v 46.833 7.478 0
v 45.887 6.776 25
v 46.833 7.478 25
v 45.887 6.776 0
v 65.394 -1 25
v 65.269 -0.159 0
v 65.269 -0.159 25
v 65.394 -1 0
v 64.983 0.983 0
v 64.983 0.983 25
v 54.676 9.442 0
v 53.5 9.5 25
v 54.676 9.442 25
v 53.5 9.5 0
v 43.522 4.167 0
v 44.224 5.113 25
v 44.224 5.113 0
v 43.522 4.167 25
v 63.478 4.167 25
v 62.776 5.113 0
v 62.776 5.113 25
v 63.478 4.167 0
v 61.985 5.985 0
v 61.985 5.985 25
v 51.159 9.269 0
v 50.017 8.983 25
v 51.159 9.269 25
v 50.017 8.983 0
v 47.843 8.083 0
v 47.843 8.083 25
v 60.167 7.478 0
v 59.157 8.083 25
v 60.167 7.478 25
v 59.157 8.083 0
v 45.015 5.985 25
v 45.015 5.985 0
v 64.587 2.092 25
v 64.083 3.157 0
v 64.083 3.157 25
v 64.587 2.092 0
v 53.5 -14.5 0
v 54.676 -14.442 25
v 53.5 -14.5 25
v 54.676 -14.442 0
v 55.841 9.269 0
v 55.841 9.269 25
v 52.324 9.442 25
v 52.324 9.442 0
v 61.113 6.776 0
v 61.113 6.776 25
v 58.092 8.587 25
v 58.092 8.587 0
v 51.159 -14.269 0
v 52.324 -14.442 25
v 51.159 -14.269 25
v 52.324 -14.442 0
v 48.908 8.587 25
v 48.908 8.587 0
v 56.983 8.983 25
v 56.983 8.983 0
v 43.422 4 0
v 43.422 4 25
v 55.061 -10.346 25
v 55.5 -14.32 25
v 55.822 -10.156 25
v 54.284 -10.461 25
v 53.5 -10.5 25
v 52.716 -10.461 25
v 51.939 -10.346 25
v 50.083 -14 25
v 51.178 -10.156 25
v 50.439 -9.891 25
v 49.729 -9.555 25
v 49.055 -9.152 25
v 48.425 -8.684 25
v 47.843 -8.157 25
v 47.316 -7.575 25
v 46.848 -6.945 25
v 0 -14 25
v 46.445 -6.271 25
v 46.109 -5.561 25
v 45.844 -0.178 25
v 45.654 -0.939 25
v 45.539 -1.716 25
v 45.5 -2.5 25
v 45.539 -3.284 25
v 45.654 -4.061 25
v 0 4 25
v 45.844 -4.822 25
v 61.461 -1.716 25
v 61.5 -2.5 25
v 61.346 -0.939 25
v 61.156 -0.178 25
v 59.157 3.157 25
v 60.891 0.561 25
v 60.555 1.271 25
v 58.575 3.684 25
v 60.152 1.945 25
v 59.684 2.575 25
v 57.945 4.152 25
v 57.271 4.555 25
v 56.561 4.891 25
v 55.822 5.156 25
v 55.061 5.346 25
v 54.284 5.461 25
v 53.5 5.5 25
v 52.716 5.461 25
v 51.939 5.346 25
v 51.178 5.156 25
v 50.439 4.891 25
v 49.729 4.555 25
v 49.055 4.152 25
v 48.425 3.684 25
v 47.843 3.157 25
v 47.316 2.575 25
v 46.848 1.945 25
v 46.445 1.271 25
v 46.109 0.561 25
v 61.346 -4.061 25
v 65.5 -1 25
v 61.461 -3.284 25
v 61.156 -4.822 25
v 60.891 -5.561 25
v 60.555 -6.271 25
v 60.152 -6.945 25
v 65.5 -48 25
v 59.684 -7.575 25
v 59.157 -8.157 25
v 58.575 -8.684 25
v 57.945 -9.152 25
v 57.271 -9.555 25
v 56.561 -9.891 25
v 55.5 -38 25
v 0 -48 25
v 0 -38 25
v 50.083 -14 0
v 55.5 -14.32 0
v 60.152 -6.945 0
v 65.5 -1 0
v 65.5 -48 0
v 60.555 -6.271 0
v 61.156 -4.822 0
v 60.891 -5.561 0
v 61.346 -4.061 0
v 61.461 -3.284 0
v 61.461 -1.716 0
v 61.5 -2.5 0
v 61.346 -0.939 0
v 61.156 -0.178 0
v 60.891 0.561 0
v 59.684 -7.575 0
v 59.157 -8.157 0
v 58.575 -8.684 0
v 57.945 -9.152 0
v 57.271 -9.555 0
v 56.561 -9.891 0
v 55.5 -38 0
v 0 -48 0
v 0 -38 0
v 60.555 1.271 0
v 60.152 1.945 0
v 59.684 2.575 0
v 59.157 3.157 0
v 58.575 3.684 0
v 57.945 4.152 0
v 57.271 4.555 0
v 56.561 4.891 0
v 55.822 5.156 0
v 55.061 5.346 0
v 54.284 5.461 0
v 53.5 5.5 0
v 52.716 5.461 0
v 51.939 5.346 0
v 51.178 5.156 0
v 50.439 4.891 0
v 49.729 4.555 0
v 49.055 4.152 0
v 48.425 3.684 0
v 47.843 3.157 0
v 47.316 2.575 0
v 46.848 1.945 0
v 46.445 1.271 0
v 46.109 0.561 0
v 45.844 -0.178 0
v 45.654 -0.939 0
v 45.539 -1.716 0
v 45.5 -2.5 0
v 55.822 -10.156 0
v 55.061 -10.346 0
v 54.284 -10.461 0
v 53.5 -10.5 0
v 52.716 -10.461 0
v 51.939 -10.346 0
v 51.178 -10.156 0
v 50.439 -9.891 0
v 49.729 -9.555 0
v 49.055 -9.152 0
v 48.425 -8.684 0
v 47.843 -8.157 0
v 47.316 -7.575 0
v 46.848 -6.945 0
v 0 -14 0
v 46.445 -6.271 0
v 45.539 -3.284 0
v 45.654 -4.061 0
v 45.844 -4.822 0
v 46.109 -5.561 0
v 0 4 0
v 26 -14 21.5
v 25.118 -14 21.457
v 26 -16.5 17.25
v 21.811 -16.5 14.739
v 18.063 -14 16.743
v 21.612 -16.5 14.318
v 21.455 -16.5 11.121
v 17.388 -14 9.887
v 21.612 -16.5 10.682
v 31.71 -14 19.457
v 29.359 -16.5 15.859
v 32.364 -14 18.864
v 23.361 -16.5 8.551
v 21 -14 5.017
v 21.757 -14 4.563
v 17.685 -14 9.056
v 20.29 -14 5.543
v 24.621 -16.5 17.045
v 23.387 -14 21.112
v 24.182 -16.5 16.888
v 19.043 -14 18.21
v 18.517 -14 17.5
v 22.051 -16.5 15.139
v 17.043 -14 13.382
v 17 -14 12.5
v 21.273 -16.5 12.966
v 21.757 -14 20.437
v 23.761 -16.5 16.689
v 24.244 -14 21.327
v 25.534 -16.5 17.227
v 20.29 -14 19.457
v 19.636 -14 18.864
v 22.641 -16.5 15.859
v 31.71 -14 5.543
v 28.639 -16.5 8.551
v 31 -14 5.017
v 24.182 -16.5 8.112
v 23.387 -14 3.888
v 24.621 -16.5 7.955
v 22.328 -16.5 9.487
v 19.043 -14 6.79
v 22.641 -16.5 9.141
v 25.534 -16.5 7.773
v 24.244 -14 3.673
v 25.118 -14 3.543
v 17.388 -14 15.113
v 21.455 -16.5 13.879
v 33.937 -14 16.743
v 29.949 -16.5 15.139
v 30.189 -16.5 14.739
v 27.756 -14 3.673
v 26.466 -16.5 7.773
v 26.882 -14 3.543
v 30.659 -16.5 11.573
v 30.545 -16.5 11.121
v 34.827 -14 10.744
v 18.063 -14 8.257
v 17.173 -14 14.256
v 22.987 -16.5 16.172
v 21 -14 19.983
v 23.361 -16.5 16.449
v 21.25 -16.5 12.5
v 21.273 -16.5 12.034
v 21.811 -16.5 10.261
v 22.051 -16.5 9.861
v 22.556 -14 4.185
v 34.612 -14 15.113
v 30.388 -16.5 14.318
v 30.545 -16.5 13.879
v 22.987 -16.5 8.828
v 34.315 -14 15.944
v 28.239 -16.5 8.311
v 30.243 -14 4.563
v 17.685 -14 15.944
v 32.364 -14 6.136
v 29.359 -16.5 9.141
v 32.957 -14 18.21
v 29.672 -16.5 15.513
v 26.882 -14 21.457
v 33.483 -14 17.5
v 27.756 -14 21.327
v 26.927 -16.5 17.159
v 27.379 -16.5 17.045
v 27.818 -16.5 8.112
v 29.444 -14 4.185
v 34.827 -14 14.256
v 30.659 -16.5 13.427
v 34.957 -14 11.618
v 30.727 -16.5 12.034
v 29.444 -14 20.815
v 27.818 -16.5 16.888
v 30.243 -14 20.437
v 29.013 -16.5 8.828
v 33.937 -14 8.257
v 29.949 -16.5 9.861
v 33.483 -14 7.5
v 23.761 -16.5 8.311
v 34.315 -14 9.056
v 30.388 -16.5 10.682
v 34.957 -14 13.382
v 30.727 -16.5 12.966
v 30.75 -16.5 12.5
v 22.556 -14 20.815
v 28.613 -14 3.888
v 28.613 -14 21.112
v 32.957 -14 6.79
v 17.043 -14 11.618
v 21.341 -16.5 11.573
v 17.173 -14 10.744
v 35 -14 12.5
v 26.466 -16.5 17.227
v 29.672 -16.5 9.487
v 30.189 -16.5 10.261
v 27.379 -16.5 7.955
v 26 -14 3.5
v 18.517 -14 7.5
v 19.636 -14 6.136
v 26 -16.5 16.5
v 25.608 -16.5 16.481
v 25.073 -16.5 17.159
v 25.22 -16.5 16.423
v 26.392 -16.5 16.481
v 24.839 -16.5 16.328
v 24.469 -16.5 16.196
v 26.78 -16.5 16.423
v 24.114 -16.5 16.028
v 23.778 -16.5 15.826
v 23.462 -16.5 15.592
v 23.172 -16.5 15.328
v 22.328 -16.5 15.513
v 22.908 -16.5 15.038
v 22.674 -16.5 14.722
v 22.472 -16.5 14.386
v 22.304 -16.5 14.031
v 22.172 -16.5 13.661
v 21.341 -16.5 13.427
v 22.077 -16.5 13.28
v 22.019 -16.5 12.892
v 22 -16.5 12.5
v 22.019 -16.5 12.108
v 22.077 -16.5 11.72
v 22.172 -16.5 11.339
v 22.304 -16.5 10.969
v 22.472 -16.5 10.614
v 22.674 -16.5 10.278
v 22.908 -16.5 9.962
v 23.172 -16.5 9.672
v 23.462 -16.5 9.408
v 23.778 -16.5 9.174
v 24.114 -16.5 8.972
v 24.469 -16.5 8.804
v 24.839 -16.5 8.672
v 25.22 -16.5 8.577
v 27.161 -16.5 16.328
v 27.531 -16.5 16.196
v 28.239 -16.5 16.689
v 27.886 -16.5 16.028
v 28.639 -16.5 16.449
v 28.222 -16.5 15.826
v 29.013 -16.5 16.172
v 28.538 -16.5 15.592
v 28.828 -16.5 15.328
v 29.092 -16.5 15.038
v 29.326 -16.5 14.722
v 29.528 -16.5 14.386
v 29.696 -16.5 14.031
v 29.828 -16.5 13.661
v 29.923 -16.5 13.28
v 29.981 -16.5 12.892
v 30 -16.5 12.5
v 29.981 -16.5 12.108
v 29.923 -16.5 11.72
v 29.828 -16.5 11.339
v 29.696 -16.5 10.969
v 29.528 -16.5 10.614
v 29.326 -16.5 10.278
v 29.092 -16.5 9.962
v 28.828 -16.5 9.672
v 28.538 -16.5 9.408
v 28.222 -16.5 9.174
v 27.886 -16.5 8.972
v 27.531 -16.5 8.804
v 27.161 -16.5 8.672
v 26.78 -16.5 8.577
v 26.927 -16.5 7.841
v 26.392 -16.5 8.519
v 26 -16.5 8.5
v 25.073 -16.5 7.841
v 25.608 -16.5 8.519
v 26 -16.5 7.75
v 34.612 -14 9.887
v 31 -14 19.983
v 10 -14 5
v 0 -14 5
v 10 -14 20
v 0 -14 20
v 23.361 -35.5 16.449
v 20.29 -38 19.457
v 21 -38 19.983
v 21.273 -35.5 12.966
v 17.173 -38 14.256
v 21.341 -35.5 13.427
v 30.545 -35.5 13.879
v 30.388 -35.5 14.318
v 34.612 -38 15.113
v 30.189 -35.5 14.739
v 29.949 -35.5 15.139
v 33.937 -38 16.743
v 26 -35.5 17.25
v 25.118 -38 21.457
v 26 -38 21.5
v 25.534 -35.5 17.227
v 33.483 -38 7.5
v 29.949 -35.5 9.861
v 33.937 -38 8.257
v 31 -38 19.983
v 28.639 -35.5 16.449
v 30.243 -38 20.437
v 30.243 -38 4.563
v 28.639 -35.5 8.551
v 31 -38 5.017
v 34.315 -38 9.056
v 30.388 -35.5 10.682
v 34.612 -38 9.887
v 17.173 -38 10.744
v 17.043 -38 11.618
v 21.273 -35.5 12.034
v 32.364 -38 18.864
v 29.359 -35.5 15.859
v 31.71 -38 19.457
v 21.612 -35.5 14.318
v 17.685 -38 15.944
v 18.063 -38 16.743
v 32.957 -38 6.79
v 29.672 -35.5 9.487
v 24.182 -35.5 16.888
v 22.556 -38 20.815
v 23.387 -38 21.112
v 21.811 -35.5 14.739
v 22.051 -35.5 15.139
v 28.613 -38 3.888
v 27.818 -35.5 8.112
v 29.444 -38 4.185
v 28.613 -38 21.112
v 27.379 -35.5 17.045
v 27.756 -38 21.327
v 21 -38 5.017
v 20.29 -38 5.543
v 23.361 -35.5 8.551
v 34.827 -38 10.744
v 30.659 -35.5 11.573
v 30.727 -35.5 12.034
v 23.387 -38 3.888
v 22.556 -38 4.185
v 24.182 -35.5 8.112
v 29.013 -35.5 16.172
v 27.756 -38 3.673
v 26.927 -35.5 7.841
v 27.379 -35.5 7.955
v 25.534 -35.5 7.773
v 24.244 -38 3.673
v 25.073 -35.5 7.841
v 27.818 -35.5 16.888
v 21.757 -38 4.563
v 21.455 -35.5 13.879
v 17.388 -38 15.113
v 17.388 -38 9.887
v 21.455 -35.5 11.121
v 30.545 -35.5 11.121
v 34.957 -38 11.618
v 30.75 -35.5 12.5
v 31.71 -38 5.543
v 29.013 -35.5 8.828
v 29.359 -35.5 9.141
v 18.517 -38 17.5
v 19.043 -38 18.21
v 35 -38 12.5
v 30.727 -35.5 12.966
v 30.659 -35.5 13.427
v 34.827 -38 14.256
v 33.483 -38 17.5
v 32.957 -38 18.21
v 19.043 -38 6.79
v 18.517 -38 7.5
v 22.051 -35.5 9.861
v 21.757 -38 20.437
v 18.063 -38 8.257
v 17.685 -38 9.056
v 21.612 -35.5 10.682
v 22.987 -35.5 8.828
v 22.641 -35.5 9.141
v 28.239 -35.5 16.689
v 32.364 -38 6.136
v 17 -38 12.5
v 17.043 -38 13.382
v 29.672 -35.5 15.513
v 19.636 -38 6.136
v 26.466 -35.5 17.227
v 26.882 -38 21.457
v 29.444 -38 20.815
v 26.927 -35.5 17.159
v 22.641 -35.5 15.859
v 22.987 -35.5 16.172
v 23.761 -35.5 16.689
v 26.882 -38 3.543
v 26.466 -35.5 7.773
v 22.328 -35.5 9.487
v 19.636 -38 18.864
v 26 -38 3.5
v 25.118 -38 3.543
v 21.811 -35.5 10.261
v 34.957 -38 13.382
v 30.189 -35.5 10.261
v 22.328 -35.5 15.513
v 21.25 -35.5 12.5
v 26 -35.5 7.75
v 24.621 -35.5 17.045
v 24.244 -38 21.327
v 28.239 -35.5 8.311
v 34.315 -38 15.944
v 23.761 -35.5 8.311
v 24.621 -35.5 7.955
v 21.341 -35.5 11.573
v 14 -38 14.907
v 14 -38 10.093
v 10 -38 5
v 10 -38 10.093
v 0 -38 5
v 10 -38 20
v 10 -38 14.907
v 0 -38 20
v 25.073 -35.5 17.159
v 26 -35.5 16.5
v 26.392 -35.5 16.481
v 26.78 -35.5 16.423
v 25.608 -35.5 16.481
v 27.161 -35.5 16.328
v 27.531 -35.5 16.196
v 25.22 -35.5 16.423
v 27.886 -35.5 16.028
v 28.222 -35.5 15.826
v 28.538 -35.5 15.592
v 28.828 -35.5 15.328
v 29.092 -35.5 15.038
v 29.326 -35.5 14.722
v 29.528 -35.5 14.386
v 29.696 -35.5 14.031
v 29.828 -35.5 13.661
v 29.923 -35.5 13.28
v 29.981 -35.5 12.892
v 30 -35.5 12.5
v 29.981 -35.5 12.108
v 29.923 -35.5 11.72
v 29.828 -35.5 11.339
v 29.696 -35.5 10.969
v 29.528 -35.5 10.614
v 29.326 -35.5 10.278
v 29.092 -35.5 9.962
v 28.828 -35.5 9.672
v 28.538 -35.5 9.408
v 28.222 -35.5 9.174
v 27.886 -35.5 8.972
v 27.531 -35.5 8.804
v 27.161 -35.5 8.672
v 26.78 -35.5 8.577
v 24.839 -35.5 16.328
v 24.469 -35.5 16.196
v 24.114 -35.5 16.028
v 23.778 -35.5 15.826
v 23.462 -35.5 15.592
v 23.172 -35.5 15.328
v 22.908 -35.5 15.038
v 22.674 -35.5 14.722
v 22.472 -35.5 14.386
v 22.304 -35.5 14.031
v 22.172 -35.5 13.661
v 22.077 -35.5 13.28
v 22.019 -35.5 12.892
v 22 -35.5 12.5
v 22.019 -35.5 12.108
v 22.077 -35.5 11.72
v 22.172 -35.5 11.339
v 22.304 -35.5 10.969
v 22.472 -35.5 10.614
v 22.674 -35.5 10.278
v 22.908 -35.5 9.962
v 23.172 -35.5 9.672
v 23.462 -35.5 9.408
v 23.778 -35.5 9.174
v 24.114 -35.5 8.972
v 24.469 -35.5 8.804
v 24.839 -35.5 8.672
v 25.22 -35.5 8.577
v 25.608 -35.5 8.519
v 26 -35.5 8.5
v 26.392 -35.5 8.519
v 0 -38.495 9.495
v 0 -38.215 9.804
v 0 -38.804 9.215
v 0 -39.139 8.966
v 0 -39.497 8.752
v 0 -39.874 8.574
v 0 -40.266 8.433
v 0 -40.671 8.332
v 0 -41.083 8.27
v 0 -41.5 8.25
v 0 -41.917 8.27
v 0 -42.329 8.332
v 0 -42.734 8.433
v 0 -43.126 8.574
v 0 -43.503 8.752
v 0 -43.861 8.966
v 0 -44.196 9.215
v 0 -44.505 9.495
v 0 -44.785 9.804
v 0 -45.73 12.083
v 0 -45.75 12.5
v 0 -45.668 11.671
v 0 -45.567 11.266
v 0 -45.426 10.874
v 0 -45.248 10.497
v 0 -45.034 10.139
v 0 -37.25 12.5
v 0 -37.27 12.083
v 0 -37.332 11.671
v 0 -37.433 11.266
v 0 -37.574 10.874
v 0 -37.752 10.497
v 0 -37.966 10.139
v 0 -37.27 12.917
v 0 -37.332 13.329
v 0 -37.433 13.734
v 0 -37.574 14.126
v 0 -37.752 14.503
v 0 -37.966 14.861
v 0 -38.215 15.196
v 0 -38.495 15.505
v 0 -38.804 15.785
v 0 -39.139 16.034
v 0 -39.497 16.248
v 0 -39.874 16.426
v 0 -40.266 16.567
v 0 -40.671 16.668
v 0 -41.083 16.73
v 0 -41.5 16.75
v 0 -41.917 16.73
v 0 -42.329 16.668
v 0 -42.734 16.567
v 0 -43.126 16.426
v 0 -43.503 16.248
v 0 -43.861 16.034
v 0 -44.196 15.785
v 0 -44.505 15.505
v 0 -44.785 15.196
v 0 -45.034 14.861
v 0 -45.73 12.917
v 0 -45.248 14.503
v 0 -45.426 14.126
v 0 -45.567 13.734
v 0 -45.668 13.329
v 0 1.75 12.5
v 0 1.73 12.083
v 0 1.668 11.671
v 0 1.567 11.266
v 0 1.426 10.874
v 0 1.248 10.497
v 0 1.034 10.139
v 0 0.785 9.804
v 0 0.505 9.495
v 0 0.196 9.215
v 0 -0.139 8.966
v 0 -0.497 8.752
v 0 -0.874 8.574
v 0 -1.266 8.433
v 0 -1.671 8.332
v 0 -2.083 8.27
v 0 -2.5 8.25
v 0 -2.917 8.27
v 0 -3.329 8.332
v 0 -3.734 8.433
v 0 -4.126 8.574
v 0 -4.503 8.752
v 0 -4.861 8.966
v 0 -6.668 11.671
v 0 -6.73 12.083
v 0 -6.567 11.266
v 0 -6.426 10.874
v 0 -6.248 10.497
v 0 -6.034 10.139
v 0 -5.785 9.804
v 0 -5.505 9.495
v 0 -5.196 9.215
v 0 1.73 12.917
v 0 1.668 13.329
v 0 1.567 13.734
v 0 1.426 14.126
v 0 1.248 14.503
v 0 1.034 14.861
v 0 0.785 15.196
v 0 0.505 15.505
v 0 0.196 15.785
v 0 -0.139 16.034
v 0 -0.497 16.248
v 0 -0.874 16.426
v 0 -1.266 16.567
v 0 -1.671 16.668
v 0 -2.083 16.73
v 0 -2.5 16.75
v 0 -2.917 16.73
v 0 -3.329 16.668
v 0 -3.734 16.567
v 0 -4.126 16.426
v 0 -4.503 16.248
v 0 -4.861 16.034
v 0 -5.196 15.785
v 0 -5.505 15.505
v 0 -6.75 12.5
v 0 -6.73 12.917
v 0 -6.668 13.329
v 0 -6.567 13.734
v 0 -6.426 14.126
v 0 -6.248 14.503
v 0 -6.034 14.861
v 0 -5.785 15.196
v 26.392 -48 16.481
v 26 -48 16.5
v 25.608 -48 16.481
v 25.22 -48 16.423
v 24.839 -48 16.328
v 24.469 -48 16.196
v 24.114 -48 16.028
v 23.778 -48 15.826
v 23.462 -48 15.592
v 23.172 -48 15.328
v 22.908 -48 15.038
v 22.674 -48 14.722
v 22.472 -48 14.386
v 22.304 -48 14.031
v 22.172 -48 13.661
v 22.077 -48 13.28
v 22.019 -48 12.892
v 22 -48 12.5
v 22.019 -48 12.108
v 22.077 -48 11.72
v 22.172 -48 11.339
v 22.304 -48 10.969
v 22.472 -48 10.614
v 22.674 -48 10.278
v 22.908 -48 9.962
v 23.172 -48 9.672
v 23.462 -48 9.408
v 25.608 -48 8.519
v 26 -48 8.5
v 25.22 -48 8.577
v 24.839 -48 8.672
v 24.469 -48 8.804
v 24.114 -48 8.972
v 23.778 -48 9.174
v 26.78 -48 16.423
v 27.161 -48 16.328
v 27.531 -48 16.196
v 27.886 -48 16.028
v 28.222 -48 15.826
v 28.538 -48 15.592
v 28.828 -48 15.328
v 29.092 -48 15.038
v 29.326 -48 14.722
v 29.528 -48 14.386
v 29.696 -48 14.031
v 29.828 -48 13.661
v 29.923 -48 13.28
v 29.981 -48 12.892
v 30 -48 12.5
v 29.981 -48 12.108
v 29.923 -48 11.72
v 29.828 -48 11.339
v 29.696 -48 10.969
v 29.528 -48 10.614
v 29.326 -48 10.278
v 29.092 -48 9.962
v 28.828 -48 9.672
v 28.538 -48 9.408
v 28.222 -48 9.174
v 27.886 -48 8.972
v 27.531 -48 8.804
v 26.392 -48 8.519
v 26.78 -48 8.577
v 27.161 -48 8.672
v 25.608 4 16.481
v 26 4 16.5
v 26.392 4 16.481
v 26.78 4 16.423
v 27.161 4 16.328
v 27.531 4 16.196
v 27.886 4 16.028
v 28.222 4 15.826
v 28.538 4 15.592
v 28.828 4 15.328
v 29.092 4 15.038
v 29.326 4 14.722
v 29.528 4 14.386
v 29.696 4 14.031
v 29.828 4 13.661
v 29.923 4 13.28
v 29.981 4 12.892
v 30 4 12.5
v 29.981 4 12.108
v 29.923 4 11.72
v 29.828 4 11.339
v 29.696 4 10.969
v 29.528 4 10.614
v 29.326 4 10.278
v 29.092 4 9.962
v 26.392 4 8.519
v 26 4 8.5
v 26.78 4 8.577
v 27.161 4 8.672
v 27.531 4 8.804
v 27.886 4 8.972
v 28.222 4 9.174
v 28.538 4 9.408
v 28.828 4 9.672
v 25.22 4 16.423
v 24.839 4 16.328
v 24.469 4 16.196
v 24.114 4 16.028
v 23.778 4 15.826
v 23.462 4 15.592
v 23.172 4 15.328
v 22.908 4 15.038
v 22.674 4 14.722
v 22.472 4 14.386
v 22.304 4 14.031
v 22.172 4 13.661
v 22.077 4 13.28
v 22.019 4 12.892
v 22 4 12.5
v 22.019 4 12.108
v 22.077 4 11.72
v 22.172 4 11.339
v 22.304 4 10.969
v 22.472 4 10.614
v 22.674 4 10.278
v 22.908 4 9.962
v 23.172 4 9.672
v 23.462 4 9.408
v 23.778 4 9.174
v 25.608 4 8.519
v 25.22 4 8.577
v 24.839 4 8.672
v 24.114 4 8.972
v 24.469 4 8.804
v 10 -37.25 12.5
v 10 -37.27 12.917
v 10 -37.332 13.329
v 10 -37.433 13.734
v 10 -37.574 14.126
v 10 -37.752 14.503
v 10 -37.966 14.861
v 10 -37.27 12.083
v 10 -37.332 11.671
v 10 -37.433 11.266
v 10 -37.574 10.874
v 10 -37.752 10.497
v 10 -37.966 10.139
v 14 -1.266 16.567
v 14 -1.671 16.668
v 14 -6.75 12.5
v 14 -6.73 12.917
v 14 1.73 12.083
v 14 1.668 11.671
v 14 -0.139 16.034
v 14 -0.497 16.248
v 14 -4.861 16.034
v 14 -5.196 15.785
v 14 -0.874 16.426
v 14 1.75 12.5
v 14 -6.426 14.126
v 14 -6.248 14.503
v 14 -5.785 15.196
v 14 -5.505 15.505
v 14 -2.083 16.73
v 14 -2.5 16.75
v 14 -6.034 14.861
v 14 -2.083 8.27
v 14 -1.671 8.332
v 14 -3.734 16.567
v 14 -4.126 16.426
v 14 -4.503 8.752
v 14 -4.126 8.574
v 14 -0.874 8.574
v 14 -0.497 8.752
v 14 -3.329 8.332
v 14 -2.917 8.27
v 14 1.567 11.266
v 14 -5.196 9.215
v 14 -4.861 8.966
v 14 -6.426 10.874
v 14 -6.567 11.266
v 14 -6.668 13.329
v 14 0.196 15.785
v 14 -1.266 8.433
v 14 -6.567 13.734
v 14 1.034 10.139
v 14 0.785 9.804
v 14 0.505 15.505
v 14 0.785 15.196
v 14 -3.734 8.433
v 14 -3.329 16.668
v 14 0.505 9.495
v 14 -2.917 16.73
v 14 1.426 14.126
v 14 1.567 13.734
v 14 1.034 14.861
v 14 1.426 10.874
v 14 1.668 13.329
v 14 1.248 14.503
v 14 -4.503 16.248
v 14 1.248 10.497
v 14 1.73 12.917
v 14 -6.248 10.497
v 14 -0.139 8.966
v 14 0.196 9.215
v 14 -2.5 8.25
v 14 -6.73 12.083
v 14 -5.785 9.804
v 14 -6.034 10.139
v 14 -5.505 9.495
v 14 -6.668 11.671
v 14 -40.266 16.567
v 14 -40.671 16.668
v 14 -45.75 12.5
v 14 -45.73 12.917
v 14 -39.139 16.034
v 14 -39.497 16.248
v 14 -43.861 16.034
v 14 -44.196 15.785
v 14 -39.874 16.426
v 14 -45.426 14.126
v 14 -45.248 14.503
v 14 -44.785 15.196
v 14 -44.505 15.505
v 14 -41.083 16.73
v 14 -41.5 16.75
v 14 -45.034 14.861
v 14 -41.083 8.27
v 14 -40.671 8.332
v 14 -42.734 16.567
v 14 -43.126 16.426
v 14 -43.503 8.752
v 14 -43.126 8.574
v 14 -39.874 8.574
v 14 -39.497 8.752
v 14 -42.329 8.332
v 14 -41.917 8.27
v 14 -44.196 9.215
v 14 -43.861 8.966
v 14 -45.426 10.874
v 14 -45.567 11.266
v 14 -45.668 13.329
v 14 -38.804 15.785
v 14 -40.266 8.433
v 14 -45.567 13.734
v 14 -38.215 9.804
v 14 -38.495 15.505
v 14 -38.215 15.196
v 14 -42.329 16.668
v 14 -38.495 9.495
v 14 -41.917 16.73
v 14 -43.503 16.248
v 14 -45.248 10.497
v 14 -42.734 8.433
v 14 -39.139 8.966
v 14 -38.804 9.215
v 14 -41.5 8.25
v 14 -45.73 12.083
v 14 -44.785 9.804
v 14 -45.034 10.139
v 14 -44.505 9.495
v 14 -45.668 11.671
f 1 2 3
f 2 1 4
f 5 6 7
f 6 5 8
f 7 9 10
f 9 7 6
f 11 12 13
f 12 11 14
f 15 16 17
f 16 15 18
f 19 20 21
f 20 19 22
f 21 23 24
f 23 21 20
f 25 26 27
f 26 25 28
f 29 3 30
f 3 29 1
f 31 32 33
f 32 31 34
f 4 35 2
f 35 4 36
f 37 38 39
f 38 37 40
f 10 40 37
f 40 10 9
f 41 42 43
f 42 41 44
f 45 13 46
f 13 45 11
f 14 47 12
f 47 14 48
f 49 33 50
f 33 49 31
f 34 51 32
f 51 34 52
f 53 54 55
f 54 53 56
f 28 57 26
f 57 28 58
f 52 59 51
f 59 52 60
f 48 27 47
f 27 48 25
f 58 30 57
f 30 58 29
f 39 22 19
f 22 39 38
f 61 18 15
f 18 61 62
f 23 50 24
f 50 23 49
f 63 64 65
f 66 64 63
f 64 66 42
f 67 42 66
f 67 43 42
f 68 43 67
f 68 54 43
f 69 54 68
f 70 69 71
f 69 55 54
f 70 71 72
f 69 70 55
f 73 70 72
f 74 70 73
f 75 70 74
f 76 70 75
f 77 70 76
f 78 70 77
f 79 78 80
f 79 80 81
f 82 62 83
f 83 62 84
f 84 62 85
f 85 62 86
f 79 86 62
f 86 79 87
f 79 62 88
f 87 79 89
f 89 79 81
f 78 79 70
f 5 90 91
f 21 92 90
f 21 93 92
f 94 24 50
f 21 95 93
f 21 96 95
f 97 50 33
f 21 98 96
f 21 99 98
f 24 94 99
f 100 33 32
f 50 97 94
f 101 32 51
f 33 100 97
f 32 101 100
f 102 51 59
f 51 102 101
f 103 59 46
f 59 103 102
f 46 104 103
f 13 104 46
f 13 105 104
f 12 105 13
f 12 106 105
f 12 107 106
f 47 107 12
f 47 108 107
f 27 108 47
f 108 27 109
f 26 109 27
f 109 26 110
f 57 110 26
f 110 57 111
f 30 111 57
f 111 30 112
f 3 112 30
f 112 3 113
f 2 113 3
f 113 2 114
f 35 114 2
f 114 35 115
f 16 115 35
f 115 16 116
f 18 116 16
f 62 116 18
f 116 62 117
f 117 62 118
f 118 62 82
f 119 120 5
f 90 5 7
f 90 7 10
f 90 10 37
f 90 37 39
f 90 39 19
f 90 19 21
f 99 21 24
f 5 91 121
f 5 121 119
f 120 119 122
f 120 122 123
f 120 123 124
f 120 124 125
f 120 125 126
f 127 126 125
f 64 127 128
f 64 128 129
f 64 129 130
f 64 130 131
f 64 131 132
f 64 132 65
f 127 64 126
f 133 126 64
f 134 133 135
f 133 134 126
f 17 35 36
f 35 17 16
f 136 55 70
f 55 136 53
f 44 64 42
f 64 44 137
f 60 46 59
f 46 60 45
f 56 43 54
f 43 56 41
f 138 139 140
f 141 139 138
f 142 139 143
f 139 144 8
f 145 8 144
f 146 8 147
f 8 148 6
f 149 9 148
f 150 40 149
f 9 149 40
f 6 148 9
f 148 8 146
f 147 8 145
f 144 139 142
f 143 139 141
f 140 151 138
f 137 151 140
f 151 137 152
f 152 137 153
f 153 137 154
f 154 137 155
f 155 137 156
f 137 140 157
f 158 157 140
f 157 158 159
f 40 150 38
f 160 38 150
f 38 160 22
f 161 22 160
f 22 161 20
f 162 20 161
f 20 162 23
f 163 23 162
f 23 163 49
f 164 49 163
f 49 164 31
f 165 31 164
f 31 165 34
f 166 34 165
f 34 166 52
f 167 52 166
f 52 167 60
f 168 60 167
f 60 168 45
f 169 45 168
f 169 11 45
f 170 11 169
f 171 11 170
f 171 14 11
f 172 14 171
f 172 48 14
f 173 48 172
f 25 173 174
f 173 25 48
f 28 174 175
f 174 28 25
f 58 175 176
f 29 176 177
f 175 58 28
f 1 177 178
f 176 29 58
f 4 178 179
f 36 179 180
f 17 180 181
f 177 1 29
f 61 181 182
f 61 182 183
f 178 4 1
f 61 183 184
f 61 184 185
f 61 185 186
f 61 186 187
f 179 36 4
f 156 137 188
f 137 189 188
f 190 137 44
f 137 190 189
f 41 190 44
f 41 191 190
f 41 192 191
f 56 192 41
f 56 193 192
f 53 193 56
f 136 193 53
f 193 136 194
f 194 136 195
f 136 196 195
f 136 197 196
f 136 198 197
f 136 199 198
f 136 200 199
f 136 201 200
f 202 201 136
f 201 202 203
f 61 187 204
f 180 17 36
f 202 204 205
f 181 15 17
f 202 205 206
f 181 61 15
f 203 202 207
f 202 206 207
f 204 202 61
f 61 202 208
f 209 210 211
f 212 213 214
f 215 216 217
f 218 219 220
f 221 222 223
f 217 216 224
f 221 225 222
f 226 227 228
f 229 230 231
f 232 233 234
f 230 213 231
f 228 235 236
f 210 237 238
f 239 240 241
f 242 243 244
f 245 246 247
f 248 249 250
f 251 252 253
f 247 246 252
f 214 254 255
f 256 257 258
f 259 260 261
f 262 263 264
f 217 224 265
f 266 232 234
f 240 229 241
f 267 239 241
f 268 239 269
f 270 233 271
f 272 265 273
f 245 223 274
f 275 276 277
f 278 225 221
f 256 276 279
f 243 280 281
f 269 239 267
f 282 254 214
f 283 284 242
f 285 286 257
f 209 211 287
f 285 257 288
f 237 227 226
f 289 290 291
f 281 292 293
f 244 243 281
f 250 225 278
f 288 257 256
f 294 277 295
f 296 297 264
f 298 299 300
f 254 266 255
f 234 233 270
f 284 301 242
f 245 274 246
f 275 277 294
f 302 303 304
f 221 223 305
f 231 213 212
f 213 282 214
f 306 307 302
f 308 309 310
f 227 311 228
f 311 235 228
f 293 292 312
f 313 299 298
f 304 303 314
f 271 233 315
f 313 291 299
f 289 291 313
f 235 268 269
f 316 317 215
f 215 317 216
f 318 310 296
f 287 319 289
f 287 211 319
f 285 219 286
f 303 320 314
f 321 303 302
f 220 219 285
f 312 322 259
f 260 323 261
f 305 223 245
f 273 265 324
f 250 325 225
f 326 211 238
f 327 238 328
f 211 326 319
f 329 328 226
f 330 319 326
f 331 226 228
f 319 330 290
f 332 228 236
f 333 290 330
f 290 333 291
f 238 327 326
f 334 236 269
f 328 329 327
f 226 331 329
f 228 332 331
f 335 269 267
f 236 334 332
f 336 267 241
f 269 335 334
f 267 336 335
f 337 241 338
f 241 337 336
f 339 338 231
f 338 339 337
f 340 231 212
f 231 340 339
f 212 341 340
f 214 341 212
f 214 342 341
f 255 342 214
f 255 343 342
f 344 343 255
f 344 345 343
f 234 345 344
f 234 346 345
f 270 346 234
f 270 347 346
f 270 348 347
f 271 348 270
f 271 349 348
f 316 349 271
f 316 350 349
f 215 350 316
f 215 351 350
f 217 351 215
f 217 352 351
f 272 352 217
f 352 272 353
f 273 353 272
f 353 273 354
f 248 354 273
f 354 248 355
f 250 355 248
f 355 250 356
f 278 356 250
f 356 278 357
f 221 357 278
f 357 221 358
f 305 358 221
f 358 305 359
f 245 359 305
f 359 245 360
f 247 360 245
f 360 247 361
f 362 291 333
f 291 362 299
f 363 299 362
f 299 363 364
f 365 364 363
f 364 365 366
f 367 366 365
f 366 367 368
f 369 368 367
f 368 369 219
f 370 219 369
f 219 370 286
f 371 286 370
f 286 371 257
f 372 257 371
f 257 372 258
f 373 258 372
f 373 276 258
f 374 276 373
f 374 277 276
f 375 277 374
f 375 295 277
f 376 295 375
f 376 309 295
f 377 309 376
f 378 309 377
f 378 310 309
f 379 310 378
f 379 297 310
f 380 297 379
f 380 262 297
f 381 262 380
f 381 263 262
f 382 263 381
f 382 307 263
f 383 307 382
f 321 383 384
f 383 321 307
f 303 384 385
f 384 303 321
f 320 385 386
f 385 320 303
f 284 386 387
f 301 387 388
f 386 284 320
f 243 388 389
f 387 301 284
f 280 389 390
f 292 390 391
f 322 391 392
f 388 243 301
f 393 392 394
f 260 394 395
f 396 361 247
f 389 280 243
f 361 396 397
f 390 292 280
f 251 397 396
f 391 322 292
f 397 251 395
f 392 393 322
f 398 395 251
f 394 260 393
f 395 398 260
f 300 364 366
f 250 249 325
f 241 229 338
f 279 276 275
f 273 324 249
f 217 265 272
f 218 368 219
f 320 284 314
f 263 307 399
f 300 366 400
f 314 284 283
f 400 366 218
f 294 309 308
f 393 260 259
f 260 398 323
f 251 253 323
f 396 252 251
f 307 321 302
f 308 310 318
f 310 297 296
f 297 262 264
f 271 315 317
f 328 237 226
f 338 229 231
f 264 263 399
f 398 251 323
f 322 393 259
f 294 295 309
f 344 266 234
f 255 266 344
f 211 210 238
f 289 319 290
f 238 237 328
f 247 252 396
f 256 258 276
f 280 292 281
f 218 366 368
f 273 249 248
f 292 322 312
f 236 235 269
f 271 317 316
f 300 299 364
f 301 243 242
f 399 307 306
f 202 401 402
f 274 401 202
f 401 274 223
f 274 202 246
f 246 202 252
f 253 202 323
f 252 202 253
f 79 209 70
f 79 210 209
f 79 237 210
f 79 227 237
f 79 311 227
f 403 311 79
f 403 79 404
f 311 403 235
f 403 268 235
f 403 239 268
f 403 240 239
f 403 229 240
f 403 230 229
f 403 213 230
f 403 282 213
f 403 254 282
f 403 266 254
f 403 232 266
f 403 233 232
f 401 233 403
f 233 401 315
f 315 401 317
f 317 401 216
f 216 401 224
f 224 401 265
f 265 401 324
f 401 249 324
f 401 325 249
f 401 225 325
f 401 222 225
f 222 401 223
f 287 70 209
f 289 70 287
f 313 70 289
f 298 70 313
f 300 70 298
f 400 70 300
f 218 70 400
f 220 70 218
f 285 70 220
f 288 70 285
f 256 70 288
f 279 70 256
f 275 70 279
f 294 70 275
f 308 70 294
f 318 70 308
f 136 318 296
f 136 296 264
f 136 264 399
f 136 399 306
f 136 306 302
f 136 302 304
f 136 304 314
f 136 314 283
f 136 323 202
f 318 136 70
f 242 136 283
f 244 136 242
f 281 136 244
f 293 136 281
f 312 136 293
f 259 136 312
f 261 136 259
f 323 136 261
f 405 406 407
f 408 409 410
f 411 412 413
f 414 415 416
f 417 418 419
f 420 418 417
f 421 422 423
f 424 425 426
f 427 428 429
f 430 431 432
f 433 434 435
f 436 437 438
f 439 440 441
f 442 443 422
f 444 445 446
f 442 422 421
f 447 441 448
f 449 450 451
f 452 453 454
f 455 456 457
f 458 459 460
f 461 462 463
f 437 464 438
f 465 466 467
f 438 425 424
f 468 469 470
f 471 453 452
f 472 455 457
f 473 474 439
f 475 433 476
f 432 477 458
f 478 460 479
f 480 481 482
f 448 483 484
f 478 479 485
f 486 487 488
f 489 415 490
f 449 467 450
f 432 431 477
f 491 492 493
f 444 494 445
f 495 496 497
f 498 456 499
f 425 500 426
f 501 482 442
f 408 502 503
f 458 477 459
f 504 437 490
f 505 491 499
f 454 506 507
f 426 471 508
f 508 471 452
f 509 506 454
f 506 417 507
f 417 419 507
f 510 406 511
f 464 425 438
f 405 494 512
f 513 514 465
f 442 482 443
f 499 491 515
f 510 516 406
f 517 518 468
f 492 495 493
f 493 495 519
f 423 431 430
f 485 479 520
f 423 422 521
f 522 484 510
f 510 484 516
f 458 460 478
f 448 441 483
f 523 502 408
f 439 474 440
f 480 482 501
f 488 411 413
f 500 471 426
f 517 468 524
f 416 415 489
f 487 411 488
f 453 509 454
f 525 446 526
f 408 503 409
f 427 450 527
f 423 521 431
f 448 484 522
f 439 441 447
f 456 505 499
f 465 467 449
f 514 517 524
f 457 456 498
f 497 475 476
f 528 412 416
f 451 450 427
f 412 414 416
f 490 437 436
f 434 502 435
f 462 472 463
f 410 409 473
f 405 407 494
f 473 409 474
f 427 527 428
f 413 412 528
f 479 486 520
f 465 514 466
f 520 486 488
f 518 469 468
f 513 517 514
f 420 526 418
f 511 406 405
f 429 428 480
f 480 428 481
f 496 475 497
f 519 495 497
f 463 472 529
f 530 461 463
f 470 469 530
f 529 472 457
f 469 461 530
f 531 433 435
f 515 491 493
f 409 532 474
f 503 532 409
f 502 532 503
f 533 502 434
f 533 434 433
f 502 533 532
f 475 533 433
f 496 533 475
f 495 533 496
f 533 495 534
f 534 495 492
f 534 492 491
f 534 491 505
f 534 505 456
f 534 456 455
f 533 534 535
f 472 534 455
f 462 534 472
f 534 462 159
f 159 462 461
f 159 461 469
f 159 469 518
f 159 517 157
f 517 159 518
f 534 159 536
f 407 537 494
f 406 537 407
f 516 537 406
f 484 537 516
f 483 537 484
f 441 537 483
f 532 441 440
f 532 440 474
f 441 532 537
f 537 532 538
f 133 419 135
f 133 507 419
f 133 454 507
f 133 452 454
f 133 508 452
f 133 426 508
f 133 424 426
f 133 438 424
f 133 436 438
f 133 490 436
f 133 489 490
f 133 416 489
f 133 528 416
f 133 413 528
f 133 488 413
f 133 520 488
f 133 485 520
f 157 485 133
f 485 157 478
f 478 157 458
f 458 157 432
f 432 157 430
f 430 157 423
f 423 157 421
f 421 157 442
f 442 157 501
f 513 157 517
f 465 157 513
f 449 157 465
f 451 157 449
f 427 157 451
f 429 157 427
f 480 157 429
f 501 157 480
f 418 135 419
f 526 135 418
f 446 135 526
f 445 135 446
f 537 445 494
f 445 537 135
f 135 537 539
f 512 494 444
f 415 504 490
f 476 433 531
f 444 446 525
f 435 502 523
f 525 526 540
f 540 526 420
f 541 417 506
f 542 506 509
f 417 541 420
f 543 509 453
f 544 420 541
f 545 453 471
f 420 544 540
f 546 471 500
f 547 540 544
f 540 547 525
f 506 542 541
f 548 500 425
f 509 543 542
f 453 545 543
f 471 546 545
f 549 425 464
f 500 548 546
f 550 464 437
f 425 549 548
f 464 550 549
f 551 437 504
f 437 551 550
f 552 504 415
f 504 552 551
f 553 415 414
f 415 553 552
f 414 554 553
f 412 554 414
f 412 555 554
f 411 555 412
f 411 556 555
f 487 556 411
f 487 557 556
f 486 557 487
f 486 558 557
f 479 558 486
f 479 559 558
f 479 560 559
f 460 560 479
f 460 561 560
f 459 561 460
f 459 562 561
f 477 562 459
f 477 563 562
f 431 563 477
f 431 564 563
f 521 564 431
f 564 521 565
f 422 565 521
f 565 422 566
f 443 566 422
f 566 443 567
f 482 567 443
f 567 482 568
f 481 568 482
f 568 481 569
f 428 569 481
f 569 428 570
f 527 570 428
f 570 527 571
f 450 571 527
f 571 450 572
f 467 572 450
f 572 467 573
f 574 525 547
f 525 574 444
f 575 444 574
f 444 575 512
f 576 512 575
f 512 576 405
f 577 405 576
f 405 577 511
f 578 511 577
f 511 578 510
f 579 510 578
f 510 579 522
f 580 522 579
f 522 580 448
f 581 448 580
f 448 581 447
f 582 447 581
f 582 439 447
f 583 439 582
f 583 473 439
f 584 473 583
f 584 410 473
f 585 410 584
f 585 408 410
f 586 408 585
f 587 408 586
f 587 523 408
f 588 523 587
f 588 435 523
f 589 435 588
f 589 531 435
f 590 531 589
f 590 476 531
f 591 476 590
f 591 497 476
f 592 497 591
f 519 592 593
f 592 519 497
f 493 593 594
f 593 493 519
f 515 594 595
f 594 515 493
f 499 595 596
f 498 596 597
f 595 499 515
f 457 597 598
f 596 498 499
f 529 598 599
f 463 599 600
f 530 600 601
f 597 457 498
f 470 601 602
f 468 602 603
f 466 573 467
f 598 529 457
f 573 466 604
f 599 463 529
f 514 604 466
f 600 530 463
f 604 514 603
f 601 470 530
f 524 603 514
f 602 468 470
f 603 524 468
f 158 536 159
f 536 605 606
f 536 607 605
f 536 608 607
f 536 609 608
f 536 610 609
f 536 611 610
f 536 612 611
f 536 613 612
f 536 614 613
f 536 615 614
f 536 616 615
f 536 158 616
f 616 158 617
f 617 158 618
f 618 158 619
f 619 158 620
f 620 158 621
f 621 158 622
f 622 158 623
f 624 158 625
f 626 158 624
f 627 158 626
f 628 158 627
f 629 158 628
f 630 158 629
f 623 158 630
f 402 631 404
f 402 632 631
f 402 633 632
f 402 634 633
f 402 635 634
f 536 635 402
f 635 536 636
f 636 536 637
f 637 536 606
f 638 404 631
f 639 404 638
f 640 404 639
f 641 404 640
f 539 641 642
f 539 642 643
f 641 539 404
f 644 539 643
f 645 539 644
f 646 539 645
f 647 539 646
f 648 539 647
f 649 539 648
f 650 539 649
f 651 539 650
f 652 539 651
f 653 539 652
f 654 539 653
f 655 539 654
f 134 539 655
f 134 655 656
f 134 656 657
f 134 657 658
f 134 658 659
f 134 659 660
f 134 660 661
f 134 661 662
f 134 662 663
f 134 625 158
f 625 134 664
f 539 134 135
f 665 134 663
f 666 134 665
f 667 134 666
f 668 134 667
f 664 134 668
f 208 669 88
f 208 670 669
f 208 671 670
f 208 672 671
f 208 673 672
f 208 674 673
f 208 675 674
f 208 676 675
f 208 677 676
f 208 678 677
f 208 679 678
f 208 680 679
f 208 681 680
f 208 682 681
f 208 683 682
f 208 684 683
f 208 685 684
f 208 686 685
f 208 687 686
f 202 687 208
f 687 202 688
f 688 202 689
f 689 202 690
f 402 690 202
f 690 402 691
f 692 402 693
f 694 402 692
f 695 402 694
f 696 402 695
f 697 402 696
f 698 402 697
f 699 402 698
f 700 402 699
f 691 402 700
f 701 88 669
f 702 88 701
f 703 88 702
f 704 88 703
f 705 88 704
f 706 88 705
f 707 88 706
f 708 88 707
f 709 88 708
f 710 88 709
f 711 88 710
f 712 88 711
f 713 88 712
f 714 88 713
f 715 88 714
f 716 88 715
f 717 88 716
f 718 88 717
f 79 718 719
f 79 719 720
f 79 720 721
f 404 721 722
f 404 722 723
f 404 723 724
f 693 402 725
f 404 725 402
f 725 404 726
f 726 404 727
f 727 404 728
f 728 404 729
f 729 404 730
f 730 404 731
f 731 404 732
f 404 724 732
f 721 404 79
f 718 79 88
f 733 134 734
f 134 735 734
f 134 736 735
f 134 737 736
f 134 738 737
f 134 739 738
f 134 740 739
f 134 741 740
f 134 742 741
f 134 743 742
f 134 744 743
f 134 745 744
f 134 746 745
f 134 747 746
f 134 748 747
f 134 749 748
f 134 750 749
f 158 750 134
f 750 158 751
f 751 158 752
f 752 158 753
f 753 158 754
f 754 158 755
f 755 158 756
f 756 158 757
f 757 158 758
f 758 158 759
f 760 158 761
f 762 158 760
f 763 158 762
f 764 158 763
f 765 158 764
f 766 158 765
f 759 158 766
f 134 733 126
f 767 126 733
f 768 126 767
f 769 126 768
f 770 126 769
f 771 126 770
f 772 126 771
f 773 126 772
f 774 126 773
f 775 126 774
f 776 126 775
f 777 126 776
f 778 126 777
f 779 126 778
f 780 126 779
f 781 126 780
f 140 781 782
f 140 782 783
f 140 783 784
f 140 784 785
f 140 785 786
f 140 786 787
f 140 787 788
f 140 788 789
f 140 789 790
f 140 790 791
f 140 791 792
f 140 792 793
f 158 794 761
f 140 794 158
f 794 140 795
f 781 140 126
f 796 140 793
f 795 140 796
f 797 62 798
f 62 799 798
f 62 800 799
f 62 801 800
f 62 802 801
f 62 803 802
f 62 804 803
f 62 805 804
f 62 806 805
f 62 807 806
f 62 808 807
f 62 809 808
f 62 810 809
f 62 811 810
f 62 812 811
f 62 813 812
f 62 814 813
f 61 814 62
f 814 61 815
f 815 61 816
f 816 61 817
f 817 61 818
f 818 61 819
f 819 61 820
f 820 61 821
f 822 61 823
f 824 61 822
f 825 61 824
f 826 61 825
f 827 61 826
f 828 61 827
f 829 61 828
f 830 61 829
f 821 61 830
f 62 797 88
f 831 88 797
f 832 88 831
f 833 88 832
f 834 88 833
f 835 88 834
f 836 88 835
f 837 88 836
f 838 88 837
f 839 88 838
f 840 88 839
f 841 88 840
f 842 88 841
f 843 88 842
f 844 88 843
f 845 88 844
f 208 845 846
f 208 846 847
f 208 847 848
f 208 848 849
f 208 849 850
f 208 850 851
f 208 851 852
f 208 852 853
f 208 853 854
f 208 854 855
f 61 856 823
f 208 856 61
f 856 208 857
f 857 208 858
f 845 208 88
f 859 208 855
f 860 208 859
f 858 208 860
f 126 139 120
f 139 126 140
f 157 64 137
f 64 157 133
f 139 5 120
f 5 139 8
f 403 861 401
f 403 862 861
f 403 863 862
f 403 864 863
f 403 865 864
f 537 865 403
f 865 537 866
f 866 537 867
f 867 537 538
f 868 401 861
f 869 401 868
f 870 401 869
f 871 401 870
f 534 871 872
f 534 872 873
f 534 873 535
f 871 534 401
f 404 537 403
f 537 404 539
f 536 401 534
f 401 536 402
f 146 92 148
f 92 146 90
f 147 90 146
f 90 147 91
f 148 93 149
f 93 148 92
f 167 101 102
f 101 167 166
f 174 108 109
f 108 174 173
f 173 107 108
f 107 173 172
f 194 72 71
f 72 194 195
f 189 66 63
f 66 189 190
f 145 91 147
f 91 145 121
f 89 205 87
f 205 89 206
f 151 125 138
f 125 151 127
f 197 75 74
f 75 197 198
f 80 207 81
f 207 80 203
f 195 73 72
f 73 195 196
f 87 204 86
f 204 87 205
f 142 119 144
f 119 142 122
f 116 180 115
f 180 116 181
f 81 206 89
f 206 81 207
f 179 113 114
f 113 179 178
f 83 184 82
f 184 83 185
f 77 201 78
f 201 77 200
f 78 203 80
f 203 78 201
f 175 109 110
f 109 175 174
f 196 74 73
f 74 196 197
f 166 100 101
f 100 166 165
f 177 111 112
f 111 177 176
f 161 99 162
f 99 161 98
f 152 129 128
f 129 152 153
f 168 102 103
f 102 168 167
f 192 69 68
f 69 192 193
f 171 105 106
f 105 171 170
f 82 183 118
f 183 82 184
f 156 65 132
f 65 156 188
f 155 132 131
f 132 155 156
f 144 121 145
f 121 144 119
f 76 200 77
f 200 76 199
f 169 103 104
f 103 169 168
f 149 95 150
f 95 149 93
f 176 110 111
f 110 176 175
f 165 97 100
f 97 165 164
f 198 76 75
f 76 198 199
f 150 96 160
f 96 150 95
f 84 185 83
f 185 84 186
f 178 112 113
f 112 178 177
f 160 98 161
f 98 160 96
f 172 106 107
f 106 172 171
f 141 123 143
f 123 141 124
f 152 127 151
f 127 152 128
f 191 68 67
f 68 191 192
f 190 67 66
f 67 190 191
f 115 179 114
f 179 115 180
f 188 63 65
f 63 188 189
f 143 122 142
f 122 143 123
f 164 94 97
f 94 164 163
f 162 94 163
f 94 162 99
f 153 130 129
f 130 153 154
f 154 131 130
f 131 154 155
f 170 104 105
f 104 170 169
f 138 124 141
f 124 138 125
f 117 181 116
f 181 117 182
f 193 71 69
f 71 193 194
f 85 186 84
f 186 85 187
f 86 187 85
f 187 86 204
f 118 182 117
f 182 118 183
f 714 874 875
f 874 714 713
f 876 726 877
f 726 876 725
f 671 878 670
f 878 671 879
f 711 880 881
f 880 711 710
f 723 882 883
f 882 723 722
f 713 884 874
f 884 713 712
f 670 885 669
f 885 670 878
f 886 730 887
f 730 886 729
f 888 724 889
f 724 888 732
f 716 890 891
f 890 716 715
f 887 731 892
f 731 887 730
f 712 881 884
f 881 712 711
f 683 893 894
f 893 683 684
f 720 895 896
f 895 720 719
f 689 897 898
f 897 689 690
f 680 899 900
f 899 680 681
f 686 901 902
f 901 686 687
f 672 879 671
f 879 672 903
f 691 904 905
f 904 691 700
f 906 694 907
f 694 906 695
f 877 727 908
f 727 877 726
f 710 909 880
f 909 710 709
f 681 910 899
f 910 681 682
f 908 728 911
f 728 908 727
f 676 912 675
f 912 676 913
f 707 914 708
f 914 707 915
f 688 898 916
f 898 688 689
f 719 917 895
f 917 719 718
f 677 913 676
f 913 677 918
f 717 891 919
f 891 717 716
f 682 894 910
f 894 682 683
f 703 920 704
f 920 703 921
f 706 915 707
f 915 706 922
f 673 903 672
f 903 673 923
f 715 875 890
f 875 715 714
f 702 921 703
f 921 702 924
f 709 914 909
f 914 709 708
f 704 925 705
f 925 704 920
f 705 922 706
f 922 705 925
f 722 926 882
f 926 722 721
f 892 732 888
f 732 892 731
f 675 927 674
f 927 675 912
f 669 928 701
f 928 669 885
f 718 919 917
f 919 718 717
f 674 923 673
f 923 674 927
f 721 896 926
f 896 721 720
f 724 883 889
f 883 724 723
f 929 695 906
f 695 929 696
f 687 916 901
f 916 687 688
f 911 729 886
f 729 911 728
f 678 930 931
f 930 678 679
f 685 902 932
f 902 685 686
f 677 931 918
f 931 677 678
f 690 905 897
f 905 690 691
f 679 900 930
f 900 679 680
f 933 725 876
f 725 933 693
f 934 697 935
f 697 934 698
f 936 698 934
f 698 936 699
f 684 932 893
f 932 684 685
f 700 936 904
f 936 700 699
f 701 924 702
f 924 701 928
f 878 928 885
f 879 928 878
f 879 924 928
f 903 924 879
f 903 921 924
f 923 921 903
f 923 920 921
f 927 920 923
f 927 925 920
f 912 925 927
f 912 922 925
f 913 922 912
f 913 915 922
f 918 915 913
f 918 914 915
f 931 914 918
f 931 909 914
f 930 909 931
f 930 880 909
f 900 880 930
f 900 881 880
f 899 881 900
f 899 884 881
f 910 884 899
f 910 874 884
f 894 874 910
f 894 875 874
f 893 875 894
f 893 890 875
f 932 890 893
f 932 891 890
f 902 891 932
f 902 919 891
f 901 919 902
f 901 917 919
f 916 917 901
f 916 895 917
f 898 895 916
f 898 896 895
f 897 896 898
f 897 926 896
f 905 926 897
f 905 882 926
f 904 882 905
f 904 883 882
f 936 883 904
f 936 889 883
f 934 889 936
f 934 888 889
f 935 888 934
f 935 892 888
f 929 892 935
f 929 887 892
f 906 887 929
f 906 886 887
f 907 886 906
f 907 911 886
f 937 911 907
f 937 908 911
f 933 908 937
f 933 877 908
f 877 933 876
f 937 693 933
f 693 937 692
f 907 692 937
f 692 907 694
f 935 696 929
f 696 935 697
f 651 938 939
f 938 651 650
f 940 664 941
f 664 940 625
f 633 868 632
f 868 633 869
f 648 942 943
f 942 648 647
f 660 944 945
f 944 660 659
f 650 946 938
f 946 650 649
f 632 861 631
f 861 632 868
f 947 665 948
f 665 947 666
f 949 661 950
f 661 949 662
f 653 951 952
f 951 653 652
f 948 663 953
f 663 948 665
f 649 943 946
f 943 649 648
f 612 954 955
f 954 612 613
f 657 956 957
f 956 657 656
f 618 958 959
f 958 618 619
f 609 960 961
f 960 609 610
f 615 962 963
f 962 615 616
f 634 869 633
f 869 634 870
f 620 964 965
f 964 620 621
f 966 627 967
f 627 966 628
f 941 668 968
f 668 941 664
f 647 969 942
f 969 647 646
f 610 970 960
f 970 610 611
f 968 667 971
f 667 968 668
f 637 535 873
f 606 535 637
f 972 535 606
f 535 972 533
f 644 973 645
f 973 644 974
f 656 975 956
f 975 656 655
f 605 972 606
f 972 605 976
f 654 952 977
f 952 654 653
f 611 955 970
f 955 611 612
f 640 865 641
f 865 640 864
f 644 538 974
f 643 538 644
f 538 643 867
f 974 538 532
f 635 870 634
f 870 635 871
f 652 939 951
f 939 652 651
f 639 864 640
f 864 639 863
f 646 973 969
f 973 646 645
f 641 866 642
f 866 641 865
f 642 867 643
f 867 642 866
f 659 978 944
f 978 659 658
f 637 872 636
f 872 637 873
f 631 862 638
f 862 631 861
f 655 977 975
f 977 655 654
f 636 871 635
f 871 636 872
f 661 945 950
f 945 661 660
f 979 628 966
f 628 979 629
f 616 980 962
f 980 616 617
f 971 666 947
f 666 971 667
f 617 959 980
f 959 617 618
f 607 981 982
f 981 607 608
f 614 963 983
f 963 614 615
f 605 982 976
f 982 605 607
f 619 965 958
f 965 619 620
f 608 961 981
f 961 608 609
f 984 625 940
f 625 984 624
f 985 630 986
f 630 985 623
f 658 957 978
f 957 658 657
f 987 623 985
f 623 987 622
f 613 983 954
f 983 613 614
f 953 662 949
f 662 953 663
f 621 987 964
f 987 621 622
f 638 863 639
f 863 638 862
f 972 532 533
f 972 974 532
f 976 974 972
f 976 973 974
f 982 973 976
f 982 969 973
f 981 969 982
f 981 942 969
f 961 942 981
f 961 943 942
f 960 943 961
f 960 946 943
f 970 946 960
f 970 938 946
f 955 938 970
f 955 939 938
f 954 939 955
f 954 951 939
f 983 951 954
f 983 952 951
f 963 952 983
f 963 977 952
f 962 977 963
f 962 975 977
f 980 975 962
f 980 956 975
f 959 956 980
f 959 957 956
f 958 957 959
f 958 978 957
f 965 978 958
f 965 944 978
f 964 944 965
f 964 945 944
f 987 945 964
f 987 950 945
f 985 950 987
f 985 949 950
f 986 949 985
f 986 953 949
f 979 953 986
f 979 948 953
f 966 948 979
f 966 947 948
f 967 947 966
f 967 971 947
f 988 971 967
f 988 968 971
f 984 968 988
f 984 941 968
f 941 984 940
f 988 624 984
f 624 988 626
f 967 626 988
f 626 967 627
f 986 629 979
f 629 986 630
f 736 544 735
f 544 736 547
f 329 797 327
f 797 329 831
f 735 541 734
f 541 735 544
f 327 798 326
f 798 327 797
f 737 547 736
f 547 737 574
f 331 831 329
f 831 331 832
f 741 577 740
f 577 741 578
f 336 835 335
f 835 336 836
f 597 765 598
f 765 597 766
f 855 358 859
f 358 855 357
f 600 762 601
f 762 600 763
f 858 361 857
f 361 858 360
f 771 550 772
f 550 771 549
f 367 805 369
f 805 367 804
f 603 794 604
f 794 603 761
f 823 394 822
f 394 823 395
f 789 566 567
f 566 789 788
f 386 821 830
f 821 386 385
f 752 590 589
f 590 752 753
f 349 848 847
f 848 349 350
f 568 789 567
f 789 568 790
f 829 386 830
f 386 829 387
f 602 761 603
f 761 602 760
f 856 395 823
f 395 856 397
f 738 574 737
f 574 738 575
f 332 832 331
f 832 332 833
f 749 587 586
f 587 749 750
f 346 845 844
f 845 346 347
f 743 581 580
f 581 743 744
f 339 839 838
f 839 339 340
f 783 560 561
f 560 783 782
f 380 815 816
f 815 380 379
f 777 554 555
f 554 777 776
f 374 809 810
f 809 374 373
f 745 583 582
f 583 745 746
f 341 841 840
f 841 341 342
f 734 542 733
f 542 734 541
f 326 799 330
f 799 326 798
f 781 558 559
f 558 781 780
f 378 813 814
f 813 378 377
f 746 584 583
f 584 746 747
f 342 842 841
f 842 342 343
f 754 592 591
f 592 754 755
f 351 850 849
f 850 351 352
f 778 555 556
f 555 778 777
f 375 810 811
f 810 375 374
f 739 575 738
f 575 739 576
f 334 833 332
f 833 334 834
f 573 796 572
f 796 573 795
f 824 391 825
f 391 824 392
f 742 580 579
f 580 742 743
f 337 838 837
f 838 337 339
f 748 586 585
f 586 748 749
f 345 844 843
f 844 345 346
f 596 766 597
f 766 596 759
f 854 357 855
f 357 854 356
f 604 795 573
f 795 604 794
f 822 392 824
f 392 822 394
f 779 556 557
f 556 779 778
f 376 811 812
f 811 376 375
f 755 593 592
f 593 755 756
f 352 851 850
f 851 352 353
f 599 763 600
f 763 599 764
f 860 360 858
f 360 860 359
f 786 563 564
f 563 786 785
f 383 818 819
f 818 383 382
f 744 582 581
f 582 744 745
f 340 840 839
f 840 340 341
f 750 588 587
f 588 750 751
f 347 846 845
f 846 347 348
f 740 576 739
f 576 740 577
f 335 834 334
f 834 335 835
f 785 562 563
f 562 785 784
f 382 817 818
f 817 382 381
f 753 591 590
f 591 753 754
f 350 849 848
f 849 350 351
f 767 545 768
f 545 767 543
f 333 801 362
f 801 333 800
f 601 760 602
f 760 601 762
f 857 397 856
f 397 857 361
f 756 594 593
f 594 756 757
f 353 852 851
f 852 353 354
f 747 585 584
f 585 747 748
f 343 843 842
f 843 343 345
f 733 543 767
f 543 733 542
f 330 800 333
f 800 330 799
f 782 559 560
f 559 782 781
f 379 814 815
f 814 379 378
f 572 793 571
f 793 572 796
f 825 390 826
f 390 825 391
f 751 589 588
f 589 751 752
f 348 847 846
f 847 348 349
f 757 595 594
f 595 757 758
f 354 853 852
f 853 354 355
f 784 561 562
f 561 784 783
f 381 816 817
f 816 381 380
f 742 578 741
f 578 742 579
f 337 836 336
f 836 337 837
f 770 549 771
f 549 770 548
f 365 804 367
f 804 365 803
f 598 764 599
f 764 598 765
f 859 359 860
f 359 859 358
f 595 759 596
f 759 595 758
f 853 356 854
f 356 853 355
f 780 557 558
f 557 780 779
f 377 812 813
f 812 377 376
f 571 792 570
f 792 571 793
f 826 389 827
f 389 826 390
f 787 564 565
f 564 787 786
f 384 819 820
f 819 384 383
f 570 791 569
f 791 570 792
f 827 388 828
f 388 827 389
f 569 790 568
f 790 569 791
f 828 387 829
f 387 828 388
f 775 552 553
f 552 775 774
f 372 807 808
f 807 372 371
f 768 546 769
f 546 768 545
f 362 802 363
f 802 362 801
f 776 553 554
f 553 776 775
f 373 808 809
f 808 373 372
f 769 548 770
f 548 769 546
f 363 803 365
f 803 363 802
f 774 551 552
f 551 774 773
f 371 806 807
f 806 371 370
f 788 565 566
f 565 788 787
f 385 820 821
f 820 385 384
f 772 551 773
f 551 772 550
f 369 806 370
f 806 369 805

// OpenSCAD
//#translate([98.45,-96.11,0])import("patin.stl");
$fn=64;
difference(){
union(){
translate([53.5,-2.5,0])cylinder(r=24/2,h=25);
translate([26,-14,25/2])rotate([0,3*90,90])cylinder(r1=18/2,r2=9.5/2,h=2.5);
translate([26,-14-21.5,25/2])rotate([0,3*90,90])cylinder(r2=18/2,r1=9.5/2,h=2.5);
translate([0,-44-4,0])cube([57,10,25]);
translate([0,-14,0])cube([55,18,25]);
translate([55.5,-48,0])cube([10,47,25]);
translate([0,-44,5])cube([10,44,15]);
}
translate([53.5,-2.5,-5])cylinder(r=16/2,h=40);
translate([14,-2.5,25/2])rotate([0,3*90,0])cylinder(r=8.5/2,h=30);
translate([14,-2.5-39,25/2])rotate([0,3*90,0])cylinder(r=8.5/2,h=30);
translate([26,20,25/2])rotate([0,3*90,90])cylinder(r=8/2,h=80);

}
